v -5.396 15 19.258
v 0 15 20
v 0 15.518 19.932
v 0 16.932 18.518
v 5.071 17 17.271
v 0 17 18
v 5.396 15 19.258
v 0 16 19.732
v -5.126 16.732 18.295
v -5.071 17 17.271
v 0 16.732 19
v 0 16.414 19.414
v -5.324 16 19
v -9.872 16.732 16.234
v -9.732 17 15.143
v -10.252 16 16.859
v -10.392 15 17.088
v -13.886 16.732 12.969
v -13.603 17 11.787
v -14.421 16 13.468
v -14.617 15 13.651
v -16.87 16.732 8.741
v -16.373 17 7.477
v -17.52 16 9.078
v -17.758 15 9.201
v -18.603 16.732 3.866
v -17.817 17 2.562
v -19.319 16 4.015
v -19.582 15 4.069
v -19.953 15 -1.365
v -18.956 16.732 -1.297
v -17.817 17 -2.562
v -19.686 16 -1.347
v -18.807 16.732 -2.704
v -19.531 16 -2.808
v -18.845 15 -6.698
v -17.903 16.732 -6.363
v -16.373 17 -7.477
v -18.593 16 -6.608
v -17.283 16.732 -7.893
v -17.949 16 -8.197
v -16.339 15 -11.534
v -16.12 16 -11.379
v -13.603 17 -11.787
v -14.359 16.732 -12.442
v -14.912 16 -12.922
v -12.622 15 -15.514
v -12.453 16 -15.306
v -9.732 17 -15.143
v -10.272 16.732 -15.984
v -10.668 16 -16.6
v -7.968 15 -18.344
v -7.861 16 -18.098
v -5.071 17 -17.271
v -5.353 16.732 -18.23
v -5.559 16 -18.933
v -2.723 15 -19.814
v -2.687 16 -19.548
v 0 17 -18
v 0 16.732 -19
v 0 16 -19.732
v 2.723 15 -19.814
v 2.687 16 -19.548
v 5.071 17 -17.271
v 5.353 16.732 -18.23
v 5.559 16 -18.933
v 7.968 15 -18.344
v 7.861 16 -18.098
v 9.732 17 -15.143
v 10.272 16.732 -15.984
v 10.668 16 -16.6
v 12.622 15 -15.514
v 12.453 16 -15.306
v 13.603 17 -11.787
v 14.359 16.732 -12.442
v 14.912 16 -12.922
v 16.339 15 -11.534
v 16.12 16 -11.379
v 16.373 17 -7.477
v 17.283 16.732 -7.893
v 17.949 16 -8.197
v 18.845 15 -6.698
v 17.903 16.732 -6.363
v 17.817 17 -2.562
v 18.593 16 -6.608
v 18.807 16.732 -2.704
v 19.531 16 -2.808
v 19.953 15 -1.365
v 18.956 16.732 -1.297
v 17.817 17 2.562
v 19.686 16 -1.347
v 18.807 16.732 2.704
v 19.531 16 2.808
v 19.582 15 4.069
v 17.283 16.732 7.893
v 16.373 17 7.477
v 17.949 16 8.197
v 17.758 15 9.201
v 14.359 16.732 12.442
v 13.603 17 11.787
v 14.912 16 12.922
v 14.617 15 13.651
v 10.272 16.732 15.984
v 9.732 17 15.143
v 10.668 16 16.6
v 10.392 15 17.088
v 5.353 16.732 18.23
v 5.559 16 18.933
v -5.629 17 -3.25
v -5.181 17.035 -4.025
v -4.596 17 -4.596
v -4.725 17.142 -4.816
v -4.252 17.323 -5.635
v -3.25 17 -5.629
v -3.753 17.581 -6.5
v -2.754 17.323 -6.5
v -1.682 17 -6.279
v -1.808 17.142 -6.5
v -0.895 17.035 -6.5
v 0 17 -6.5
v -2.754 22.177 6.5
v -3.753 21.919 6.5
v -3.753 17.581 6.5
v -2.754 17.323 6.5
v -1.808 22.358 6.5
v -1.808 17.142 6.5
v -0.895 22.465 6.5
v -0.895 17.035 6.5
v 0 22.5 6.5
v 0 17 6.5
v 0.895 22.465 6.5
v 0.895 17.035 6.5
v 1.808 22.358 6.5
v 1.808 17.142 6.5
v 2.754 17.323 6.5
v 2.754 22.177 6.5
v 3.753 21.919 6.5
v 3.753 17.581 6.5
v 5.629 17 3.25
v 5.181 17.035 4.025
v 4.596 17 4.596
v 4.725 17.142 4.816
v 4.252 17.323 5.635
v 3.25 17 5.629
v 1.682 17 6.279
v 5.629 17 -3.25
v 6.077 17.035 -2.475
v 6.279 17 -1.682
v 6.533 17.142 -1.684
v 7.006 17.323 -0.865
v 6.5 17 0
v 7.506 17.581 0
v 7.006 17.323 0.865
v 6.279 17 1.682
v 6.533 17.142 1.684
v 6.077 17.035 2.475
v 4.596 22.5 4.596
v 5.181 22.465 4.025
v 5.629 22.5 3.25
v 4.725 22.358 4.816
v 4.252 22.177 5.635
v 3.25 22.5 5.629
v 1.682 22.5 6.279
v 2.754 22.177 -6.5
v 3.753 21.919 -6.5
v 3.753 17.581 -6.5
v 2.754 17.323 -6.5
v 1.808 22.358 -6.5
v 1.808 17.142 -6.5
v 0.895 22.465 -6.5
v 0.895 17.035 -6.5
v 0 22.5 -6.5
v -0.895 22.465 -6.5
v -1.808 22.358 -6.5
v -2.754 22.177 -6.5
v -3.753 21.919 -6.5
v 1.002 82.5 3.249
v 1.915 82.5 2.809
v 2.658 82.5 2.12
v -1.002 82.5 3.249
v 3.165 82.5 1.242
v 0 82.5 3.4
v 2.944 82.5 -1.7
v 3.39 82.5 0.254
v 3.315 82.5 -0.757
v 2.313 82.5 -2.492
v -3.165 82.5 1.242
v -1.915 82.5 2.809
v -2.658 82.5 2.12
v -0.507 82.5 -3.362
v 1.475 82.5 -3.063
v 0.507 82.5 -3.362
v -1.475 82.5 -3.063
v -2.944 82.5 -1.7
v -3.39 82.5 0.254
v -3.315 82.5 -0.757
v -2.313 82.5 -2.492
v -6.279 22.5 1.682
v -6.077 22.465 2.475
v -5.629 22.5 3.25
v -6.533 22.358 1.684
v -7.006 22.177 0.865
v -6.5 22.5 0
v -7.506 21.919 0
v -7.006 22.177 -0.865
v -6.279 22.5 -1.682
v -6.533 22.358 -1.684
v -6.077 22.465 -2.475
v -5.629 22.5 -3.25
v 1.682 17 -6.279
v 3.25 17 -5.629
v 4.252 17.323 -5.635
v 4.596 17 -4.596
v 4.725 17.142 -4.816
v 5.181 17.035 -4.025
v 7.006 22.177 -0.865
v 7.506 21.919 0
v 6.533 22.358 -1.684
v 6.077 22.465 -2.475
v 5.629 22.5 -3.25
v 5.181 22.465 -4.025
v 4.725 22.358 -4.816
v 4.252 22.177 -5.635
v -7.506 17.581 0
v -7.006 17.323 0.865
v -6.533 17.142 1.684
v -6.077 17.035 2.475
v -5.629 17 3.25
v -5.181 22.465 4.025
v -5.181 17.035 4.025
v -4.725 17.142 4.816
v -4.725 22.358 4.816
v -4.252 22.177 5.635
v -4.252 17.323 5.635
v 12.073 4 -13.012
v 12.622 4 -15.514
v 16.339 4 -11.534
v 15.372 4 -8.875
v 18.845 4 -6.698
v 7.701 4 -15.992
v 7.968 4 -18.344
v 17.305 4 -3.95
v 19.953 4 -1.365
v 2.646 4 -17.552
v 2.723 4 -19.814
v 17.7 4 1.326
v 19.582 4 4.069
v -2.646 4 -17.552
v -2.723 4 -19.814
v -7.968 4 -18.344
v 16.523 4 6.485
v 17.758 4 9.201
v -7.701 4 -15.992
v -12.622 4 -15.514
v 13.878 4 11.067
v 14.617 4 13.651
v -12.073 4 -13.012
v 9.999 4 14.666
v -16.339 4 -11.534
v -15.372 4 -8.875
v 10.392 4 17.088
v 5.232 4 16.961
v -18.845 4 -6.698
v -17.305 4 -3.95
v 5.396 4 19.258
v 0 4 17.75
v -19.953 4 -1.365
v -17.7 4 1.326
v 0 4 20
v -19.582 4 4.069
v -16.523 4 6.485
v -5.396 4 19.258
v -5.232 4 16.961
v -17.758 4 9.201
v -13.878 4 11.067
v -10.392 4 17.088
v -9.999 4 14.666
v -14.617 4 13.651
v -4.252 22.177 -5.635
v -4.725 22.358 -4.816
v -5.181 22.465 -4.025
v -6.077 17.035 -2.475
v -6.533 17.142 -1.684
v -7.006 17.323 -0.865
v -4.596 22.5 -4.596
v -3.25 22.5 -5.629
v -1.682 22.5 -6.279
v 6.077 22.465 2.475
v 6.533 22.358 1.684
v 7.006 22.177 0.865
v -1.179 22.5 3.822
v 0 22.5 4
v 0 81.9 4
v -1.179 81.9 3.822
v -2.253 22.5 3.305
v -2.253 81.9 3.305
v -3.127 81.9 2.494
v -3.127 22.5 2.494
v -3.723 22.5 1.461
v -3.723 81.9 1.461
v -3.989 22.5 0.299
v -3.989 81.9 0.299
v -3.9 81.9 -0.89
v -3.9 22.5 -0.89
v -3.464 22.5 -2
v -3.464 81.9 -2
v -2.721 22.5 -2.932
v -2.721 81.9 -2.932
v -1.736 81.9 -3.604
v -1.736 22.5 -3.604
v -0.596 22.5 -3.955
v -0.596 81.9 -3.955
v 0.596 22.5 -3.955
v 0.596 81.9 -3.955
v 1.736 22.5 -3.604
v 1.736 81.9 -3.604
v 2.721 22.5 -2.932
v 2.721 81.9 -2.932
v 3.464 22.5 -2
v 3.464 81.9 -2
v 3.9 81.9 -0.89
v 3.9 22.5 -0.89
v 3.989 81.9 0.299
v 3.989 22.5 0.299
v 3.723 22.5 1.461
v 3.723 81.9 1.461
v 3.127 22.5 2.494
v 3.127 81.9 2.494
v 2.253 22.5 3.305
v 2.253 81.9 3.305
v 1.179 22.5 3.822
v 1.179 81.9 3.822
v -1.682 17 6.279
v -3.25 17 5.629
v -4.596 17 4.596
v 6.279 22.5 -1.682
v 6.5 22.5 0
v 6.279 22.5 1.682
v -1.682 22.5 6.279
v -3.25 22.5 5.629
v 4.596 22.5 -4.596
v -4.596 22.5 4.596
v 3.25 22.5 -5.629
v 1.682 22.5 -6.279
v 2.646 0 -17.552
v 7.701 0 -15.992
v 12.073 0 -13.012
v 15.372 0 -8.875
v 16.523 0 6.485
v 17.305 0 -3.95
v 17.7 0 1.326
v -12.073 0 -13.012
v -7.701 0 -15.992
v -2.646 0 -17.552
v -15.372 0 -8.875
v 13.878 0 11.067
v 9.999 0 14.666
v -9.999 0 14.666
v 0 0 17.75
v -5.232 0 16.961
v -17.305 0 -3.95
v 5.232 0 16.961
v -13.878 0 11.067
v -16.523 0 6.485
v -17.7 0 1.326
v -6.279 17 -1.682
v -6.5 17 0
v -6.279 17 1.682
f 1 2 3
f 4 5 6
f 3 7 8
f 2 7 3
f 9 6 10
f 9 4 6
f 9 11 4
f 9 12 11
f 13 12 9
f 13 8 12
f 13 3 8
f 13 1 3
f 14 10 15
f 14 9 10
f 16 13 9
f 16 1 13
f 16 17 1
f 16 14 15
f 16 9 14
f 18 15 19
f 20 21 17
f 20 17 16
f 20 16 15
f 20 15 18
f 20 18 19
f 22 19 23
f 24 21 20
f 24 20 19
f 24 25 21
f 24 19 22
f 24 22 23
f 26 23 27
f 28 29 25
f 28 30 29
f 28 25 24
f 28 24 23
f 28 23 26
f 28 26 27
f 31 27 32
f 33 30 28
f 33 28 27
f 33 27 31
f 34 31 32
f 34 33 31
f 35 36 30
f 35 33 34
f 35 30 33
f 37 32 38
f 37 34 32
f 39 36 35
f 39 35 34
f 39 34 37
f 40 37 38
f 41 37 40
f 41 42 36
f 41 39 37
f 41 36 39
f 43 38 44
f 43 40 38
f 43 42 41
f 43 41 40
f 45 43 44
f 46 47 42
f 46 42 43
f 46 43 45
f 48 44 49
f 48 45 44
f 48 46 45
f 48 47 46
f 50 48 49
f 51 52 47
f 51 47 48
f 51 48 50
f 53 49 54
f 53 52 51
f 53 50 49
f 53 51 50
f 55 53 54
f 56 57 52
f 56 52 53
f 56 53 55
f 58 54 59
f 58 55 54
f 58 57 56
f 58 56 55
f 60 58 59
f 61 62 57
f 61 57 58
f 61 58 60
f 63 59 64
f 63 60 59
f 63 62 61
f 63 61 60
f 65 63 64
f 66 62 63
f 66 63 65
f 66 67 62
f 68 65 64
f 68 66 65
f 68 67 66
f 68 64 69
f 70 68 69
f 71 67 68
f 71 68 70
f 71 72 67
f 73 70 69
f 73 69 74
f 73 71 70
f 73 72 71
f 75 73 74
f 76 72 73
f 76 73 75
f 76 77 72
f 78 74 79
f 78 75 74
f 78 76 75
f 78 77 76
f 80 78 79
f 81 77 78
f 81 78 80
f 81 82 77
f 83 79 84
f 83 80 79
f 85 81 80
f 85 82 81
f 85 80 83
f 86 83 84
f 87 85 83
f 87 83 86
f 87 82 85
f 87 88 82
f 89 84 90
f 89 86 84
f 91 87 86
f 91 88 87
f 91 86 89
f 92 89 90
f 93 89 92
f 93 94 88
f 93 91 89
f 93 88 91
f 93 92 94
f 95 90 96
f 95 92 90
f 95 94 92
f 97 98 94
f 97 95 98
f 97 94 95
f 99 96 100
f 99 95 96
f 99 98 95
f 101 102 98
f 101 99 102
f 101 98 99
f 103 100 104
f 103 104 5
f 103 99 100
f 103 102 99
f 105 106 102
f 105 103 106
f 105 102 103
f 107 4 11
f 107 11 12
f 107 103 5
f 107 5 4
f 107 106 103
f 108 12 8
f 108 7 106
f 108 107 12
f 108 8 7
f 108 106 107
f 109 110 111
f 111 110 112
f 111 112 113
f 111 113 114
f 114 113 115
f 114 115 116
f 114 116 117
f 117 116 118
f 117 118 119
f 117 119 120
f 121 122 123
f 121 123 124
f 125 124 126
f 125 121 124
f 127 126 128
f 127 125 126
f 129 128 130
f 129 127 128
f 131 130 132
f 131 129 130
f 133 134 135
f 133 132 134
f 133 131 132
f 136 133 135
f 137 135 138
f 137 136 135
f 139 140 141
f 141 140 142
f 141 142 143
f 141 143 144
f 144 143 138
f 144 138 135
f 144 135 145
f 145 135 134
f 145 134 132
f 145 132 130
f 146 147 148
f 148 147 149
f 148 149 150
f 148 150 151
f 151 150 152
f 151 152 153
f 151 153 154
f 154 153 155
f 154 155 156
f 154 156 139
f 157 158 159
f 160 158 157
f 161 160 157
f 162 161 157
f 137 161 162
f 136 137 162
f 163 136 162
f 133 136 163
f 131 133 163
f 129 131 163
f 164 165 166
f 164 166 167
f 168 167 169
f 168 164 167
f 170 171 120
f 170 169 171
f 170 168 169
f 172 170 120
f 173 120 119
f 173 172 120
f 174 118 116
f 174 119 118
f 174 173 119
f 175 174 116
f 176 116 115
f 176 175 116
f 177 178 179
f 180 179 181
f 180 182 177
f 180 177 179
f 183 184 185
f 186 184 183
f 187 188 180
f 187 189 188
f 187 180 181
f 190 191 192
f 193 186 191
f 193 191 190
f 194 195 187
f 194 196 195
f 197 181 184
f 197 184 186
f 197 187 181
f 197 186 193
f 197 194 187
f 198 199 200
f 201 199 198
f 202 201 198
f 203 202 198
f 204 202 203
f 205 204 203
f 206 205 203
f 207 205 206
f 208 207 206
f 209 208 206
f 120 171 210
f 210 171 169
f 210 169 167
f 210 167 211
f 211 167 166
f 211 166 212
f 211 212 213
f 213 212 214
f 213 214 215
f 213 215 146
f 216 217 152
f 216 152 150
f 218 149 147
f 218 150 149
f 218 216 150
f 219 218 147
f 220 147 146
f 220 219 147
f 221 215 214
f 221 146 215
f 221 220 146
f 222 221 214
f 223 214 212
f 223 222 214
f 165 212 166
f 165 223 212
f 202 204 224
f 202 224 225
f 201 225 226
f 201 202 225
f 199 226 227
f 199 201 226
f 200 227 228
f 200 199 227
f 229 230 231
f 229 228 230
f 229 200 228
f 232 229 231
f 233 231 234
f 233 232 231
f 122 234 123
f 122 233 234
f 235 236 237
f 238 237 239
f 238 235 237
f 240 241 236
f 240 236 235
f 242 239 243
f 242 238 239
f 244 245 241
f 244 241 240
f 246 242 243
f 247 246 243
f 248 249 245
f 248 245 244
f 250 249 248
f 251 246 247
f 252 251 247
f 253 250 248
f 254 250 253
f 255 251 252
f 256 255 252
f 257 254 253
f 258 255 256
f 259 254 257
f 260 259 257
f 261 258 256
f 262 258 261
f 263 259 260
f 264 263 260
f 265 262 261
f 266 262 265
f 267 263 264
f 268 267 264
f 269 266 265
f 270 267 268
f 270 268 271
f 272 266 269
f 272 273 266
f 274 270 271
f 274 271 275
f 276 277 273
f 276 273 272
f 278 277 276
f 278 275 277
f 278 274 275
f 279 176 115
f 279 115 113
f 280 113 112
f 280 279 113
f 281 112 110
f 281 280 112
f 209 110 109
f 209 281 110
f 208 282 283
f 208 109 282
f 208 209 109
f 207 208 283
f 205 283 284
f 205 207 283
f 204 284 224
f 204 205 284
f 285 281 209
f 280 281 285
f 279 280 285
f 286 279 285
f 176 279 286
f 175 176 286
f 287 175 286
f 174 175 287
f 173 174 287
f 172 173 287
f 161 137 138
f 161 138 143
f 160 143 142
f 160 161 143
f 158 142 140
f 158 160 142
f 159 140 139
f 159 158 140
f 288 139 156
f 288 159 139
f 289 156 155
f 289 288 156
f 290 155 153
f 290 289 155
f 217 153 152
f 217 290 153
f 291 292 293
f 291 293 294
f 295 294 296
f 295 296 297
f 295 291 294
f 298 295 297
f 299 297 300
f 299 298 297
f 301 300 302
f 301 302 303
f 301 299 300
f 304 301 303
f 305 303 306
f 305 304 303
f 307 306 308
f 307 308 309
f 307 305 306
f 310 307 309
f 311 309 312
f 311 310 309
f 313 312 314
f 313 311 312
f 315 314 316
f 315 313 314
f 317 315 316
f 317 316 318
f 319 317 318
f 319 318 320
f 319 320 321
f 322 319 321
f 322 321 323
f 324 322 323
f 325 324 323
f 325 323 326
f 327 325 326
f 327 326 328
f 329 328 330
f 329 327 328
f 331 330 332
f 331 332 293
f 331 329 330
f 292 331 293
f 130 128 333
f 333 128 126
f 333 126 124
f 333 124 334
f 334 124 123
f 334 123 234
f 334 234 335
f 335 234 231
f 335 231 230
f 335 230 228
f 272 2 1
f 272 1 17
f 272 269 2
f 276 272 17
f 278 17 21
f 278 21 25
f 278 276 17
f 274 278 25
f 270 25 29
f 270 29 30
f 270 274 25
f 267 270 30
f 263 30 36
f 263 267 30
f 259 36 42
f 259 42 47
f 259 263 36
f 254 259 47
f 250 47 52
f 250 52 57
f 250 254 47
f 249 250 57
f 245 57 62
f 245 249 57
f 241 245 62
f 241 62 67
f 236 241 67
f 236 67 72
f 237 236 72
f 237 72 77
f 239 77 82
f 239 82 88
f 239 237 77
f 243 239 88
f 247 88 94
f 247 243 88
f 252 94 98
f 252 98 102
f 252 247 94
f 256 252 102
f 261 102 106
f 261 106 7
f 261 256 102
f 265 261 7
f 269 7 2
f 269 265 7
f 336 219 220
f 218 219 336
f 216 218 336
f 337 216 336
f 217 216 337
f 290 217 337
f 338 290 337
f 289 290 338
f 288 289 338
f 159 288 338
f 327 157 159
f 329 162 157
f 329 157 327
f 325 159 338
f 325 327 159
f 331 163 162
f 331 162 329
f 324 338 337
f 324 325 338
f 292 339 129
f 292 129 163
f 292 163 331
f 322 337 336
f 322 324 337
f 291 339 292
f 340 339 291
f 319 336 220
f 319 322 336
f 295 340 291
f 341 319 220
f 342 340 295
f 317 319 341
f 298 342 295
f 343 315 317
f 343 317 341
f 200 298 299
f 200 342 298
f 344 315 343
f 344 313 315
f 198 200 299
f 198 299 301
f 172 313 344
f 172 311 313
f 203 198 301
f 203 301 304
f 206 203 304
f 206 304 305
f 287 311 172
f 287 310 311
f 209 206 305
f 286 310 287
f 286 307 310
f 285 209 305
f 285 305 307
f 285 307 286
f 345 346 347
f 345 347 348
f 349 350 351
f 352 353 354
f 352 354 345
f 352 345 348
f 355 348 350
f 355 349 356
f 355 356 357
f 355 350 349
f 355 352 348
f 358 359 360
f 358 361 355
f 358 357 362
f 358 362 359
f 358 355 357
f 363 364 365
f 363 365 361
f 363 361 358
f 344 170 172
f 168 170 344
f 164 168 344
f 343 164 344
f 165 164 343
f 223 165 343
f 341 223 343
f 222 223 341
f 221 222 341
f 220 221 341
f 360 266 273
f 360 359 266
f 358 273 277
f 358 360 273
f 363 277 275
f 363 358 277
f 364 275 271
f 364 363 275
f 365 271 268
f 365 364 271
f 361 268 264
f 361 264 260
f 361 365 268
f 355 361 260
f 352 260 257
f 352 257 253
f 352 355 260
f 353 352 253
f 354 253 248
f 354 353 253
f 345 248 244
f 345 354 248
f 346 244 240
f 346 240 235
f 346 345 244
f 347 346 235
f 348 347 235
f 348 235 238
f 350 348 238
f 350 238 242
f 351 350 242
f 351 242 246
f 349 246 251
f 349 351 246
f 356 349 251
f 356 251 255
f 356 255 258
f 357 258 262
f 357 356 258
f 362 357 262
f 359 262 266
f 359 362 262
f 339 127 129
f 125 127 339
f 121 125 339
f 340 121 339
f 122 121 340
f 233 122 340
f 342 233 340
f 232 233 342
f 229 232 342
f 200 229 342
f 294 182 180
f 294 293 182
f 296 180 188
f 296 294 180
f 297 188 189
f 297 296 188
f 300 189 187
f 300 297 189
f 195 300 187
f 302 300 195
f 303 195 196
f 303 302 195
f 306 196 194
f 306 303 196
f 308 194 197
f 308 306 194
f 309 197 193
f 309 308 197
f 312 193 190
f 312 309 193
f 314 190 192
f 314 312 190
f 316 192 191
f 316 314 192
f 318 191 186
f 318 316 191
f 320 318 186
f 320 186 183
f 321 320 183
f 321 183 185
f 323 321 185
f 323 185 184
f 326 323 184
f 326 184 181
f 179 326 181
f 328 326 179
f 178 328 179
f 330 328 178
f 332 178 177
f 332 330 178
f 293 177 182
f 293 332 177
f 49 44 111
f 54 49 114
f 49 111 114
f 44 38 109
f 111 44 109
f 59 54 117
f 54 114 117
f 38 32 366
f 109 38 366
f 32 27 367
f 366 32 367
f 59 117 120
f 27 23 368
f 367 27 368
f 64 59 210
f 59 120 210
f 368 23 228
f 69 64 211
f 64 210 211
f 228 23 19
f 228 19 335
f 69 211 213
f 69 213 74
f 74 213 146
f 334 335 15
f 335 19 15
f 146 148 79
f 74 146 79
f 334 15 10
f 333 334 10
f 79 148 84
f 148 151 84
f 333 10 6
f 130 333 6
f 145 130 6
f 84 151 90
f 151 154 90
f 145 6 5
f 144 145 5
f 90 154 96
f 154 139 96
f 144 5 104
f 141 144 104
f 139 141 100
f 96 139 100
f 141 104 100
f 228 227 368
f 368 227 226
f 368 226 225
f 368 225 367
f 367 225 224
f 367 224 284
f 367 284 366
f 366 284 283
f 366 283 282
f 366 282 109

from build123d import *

# Parameters (mm, degrees)
BOSS_EXTRUDE1_START = -60
BOSS_EXTRUDE1_DEPTH = 5.5


with BuildPart() as part:
    # Sketch1 → Revolve1 (revolve)
    with BuildSketch(Plane.XY):
        with BuildLine():
            Line((-17.75, 0), (0, 0))
            Line((0, 0), (0, 82.5))
            Line((0, 82.5), (-3.4, 82.5))
            Line((-3.4, 82.5), (-4, 81.9))
            Line((-4, 81.9), (-4, 17))
            Line((-4, 17), (-18, 17))
            ThreePointArc((-18, 17), (-19.414213562, 16.414213562), (-20, 15))
            Line((-20, 15), (-20, 4))
            Line((-20, 4), (-17.75, 4))
            Line((-17.75, 4), (-17.75, 0))
        make_face()
    revolve(axis=Axis((0, 86.625, 0), (0, -1, 0)))

    # Sketch2 → Boss-Extrude1 (add)
    with BuildSketch(Plane(origin=(0, 82.5, 0), x_dir=(0, 0, -1), z_dir=(0, 1, 0)).offset(BOSS_EXTRUDE1_START)):
        Polygon((6.5, -3.75277675), (6.5, 3.75277675), (0, 7.505553499), (-6.5, 3.75277675), (-6.5, -3.75277675), (0, -7.505553499), align=None)
    extrude(amount=-BOSS_EXTRUDE1_DEPTH)

    # Sketch3 → Cut-Revolve1 (revolve, cut)
    with BuildSketch(Plane.XY):
        Polygon((7.505553499, 22.5), (6.5, 22.5), (7.505553499, 21.919443416), align=None)
        Polygon((7.505553499, 17), (6.5, 17), (7.505553499, 17.580556584), align=None)
    revolve(axis=Axis((0, 86.625, 0), (0, -1, 0)), mode=Mode.SUBTRACT)


solid = part.part
